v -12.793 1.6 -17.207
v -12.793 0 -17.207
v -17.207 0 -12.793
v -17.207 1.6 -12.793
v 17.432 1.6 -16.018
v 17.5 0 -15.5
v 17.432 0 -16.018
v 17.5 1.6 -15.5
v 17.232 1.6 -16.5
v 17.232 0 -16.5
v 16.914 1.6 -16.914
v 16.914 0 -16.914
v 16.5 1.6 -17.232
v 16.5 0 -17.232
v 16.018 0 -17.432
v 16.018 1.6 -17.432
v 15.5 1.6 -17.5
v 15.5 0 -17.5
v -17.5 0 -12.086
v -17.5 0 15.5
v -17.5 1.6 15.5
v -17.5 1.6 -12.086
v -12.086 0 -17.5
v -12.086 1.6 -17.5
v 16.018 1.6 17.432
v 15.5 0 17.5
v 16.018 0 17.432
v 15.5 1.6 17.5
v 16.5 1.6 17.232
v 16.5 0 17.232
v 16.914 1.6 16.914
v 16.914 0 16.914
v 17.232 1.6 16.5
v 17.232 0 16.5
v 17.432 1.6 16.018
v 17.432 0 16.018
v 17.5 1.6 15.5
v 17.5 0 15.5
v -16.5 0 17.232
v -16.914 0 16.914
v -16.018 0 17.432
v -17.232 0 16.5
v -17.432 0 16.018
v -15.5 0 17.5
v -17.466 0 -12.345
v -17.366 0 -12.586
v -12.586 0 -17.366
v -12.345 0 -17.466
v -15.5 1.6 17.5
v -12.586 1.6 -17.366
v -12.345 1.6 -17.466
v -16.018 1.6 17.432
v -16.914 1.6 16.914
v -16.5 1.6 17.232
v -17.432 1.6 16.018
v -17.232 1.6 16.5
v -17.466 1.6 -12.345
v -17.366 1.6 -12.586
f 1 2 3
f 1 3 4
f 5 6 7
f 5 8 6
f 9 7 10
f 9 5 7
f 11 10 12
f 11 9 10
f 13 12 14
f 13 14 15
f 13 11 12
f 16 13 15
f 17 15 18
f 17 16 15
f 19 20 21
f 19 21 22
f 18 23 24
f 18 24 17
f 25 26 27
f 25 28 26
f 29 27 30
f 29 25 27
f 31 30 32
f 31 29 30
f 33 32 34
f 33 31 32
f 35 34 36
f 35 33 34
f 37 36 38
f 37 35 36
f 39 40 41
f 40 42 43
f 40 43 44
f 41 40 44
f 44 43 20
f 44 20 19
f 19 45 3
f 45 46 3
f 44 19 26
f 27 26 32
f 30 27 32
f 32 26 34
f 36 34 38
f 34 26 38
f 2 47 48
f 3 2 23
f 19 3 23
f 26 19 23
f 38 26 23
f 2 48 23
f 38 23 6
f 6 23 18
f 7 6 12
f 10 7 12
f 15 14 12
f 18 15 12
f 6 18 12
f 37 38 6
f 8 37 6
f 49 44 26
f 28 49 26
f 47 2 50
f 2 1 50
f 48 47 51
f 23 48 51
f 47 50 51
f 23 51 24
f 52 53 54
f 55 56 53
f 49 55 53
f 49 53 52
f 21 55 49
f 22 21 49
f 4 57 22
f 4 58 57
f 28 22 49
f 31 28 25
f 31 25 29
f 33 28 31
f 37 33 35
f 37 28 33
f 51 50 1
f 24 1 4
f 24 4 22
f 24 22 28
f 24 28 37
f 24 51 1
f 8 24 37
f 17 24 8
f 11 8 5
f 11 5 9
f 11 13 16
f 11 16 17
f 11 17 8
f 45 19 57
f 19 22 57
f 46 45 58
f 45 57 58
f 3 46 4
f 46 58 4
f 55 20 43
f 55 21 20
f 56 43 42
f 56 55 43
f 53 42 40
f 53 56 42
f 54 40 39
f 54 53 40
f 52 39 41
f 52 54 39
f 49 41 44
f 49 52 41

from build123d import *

# Parameters (mm, degrees)
SKETCH_1_W      = 35
SKETCH_1_H      = 35
EXTRUDE_1_DEPTH = 1.6
CHAMFER_1_SIZE  = 5
FILLET_1_R      = 1
FILLET_2_R      = 2


with BuildPart() as part:
    # 草图1 → 凸台-拉伸1 (new body)
    with BuildSketch(Plane(origin=(0, 0, 0), x_dir=(1, 0, 0), z_dir=(0, 1, 0))):
        Rectangle(SKETCH_1_W, SKETCH_1_H)
    extrude(amount=EXTRUDE_1_DEPTH)

    # 倒角1
    chamfer_1_edges = [part.edges().sort_by_distance(p)[0] for p in [
        (-17.5, 0.8, -17.5),
    ]]
    chamfer(chamfer_1_edges, length=CHAMFER_1_SIZE)

    # 圆角1
    fillet_1_edges = [part.edges().sort_by_distance(p)[0] for p in [
        (-17.5, 0.8, -12.5),
        (-12.5, 0.8, -17.5),
    ]]
    fillet(fillet_1_edges, radius=FILLET_1_R)

    # 圆角2
    fillet_2_edges = [part.edges().sort_by_distance(p)[0] for p in [
        (17.5, 0.8, 17.5),
        (-17.5, 0.8, 17.5),
        (17.5, 0.8, -17.5),
    ]]
    fillet(fillet_2_edges, radius=FILLET_2_R)


solid = part.part
